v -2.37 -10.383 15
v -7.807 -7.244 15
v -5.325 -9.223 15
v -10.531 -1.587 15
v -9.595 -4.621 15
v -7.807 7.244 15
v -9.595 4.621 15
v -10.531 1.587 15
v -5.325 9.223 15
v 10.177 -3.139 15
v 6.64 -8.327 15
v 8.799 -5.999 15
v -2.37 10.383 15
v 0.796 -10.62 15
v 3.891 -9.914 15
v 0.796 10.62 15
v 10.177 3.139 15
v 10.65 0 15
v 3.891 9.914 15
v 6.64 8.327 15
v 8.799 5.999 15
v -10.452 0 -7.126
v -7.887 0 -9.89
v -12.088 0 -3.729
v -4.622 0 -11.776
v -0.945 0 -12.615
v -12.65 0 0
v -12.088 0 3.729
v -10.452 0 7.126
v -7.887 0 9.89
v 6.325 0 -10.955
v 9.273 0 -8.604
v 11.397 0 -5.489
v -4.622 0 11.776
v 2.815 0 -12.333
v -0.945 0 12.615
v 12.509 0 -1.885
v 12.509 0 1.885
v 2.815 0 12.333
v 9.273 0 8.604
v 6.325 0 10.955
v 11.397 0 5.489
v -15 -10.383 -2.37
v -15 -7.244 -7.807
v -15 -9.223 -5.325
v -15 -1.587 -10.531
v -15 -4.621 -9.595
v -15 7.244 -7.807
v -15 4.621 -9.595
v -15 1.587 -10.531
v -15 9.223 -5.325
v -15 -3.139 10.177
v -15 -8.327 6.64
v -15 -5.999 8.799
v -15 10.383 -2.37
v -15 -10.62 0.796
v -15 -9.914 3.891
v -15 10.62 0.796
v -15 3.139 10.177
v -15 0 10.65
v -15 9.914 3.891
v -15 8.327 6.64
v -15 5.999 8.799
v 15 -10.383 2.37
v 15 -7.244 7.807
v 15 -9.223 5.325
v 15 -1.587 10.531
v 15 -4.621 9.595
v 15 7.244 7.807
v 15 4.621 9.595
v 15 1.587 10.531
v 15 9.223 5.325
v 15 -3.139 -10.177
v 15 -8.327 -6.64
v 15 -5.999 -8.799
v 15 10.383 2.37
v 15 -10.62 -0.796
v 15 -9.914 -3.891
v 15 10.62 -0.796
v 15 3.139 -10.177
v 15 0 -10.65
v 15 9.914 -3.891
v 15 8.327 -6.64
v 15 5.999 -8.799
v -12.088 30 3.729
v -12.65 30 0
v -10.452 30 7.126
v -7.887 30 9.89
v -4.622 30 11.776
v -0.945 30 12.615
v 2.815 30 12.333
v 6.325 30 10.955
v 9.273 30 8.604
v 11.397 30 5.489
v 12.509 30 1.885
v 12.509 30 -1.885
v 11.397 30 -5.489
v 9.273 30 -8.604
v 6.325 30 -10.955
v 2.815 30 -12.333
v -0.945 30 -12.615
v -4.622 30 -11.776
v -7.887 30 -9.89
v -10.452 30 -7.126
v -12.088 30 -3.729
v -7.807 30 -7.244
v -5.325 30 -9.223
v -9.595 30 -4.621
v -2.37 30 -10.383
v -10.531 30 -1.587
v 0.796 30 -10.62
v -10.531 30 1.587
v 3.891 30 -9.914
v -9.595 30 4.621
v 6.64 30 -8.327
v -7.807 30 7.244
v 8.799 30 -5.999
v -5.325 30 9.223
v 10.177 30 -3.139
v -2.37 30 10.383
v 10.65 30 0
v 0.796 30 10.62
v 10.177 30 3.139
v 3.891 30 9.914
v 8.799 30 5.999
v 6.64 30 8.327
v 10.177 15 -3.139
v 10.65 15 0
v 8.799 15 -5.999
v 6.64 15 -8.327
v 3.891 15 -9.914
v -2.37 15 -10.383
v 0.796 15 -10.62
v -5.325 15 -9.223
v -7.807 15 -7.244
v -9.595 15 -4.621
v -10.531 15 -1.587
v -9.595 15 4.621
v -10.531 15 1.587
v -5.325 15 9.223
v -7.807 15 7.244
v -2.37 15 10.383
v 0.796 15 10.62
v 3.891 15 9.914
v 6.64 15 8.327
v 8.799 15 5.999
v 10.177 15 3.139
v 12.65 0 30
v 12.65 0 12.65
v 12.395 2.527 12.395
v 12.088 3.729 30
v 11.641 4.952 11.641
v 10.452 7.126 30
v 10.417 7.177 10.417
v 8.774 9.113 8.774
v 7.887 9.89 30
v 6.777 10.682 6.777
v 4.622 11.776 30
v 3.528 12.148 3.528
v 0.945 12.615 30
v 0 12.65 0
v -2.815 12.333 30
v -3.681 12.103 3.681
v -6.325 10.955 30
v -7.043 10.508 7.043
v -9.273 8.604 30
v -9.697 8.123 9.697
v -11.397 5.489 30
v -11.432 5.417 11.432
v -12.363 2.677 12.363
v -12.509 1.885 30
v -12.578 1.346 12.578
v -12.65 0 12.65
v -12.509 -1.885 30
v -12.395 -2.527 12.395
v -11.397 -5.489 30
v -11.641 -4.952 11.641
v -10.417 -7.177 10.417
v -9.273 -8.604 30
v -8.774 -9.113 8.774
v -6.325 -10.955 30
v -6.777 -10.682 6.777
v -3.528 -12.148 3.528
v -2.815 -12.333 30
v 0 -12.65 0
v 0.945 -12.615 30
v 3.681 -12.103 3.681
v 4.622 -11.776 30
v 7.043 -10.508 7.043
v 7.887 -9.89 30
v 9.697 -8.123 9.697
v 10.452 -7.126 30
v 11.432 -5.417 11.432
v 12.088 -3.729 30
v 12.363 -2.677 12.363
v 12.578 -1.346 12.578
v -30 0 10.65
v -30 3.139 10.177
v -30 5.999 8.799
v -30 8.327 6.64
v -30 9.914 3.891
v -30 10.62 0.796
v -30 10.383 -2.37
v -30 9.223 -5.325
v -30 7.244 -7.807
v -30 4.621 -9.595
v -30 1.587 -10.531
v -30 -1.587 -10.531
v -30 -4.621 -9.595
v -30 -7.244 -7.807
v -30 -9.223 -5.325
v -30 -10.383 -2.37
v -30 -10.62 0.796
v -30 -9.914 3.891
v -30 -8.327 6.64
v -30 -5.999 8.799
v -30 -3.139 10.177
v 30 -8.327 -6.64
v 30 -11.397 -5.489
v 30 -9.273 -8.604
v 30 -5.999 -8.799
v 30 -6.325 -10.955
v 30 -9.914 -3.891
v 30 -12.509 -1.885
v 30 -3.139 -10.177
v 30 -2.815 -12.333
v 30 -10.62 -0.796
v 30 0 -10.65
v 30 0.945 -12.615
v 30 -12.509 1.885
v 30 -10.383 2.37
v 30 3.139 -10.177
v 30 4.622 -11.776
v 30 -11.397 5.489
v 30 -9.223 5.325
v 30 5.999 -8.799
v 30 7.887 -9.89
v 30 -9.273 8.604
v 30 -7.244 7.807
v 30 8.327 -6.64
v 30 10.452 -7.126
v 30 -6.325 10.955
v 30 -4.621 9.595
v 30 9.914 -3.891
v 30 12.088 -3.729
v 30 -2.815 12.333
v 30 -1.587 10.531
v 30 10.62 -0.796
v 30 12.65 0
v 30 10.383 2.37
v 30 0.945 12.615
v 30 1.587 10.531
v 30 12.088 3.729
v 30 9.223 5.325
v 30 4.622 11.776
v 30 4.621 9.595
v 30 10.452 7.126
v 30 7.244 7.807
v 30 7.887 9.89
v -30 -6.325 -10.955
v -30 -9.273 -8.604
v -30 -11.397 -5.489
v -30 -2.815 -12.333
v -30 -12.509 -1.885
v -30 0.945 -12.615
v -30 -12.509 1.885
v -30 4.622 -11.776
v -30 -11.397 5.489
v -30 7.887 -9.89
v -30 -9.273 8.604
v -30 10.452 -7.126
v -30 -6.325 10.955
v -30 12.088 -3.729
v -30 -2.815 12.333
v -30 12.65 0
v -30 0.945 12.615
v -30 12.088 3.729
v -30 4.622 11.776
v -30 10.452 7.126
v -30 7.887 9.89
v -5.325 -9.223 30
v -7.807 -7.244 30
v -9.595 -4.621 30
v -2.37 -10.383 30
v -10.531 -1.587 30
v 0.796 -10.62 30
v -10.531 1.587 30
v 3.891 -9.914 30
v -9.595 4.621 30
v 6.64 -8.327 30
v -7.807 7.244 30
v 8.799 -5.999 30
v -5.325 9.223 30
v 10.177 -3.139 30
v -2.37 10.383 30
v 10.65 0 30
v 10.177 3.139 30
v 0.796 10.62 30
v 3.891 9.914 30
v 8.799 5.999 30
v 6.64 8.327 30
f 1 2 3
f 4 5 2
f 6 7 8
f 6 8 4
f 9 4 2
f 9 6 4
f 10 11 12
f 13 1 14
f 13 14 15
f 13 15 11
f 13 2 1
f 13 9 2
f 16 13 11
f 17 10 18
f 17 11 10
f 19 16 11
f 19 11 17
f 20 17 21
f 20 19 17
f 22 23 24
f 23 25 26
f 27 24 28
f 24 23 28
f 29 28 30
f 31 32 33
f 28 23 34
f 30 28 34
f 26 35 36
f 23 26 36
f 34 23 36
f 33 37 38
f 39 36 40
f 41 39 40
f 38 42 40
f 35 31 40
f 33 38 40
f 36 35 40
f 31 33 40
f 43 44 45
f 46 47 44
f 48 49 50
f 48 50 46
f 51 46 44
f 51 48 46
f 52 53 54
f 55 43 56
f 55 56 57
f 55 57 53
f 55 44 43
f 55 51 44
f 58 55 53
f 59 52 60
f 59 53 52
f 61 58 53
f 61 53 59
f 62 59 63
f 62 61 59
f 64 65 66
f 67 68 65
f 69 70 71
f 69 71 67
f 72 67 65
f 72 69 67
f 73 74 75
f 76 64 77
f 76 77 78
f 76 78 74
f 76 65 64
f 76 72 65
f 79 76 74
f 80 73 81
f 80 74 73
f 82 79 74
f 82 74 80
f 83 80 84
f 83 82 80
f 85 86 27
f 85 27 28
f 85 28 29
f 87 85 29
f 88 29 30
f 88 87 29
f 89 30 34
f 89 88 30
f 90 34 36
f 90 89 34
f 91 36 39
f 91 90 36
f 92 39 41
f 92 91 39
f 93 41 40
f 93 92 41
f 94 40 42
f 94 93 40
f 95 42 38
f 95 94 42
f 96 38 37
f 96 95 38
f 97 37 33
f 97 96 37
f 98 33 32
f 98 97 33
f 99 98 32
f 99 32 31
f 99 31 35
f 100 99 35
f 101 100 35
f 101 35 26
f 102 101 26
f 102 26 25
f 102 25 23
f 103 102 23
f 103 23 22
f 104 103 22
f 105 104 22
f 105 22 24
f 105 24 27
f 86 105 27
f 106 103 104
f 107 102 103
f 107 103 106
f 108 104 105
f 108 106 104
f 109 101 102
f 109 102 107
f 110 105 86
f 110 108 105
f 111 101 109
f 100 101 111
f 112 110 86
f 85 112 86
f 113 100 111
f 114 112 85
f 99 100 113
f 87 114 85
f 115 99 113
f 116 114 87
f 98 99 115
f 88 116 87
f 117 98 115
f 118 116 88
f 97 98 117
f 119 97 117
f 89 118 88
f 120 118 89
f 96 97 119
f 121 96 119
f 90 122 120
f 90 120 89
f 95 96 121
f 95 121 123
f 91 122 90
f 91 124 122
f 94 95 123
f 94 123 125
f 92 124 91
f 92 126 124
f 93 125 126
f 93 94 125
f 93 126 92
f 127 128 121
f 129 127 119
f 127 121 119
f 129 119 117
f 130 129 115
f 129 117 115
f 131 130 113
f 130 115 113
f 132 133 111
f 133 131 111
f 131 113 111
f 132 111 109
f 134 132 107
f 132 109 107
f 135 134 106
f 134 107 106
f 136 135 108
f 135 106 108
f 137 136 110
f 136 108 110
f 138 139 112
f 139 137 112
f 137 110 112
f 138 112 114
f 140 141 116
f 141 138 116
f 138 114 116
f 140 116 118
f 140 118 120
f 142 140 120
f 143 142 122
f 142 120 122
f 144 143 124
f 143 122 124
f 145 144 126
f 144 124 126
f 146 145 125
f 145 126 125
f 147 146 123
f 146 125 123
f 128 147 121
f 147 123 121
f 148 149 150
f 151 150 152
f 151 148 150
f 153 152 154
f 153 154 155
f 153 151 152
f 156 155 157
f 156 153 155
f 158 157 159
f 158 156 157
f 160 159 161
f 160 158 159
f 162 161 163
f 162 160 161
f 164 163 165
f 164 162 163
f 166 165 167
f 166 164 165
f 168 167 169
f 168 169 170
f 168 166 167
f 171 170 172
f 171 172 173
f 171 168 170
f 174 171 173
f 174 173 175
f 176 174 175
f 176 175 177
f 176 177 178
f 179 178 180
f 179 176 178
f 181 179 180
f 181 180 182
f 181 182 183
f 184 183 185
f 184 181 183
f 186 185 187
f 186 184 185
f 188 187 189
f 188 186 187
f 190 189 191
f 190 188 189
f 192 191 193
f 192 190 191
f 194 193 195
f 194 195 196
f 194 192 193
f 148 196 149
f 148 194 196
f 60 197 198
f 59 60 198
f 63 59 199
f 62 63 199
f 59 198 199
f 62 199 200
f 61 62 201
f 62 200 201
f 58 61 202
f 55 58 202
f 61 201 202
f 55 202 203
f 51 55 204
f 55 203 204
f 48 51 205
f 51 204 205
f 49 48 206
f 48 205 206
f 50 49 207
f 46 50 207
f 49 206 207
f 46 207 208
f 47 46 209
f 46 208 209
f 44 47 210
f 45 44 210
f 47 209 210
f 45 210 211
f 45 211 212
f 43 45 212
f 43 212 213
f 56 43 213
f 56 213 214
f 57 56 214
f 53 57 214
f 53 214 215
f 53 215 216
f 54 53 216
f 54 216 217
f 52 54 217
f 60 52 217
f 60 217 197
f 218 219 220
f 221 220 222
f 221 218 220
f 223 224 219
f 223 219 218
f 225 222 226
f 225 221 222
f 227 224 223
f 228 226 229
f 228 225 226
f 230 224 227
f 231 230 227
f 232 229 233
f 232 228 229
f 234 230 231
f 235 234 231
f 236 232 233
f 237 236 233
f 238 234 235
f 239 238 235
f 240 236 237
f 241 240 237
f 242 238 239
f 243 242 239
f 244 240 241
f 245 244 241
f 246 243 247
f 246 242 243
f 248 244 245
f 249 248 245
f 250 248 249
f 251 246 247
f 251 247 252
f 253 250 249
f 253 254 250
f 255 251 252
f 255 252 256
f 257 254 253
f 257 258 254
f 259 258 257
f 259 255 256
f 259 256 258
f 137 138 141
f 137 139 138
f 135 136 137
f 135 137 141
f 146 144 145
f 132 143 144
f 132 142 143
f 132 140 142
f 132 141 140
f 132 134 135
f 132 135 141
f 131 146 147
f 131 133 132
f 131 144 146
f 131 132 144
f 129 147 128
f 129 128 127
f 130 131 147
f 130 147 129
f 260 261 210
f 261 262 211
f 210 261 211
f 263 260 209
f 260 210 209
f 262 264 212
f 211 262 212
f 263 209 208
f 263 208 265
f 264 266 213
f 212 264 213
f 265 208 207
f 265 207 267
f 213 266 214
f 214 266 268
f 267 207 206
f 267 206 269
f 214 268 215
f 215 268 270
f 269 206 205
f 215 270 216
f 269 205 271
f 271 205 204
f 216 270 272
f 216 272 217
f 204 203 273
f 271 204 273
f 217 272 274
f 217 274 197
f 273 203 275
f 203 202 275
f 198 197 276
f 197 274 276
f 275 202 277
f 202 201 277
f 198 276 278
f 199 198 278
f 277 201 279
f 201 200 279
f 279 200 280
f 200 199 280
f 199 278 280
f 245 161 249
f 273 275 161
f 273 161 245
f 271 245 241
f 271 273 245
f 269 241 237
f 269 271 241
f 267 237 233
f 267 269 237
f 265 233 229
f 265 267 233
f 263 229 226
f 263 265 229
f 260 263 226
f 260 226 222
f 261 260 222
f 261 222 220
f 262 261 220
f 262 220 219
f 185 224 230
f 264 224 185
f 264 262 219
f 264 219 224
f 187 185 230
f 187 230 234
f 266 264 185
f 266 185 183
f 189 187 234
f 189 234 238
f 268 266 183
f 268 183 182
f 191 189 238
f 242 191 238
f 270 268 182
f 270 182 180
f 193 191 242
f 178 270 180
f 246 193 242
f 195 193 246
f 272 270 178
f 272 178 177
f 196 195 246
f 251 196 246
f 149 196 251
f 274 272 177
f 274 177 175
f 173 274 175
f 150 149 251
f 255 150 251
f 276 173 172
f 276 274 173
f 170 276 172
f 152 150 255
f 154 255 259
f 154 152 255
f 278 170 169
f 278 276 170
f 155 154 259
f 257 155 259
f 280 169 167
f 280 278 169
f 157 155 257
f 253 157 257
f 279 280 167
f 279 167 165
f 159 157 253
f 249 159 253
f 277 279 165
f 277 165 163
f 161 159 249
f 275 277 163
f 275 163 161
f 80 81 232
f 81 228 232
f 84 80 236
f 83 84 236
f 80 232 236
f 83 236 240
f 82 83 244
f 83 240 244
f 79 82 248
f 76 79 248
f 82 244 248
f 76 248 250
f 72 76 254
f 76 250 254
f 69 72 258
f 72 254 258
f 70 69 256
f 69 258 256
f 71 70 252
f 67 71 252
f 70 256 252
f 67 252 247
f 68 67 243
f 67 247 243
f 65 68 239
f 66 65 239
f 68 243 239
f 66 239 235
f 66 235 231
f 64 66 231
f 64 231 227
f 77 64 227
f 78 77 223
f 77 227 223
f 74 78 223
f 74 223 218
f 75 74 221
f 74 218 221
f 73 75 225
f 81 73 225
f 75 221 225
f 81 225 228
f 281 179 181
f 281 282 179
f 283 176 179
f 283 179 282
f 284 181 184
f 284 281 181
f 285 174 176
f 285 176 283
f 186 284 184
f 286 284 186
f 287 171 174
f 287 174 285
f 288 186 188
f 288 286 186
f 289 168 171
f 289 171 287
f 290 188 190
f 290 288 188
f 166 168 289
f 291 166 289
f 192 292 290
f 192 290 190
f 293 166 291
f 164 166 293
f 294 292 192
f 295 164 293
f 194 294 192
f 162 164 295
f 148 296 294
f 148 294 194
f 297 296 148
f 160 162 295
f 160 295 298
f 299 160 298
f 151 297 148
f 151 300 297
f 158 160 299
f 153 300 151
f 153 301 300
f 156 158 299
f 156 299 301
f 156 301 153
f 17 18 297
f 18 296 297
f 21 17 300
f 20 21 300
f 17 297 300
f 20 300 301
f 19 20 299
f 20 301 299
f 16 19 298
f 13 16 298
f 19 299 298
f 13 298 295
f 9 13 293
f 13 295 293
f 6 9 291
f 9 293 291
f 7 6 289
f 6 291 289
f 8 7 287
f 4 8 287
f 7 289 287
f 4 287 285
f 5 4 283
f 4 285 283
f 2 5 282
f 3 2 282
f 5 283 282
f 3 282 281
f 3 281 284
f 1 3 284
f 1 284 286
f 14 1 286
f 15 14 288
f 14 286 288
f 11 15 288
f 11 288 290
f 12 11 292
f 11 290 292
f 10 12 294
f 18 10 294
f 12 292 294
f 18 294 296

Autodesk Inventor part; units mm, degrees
sketch "Sketch1" plane through (0, 0, 0) normal (0, 1, 0) x (-1, 0, 0)
  line L0 (0, 0) -> (0, 30)
  line L1 (0, 0) -> (-30, 0)
  dimension "d0" = 30
  dimension "d1" = 30
ref_plane "Work Plane1" through (0, 0, 30) normal (0, 0, 1) x (1, 0, 0)
sketch "Sketch2" plane through (0, 0, 30) normal (0, 0, 1) x (1, 0, 0)
  circle A0 centre (0, 0) radius 12.65
  dimension "d2" = 25.3
sketch "Sketch3" plane through (0, 0, 0) normal (0, 1, 0) x (-1, 0, 0)
  line L0 (0, 0) -> (0, 30) projected
sweep "Sweep1" add profiles "Sketch2" path "Sketch3"
sketch "Sketch4" plane through (0, 0, 0) normal (1, 0, 0) x (0, 1, 0)
  line L0 (0, 0) -> (30, 0)
  dimension "d5" = 30
ref_plane "Work Plane2" through (0, 30, 0) normal (0, 1, 0) x (-1, 0, 0)
sketch "Sketch5" plane through (0, 30, 0) normal (0, 1, 0) x (-1, 0, 0)
  circle A0 centre (0, 0) radius 12.65
  dimension "d6" = 25.3
sweep "Sweep2" add profiles "Sketch5" path "Sketch4" separate body
sketch "Sketch6" plane through (0, 0, 0) normal (0, 1, 0) x (-1, 0, 0)
  line L0 (0, 0) -> (-30, 0) projected
ref_plane "Work Plane3" through (30, 0, 0) normal (1, 0, 0) x (0, 1, 0)
sketch "Sketch12" plane through (0, 0, 0) normal (1, 0, 0) x (0, 1, 0)
  circle A0 centre (0, 0) radius 12.65
  dimension "d15" = 25.3
extrude "Extrusion1" add sketch "Sketch12" along normal mid plane 60 bodies 1
sketch "Sketch14" plane through (0, 30, 0) normal (0, 1, 0) x (1, 0, 0)
  line L0 (-12.65, -12.65) -> (0, 0) projected
  circle A0 centre (0, 0) radius 10.65
  dimension "d21" = 21.3
sketch "Sketch18" plane through (-30, 0, 0) normal (-1, 0, 0) x (0, 0, 1)
  circle A0 centre (0, 0) radius 10.65
  dimension "d30" = 21.3
extrude "Extrusion7" cut sketch "Sketch18" against normal blind 15 bodies 1
sketch "Sketch19" plane through (30, 0, 0) normal (1, 0, 0) x (0, 0, -1)
  circle A0 centre (0, 0) radius 10.65
  dimension "d33" = 21.3
extrude "Extrusion8" cut sketch "Sketch19" against normal blind 15 bodies 1
sketch "Sketch20" plane through (0, 0, 30) normal (0, 0, 1) x (1, 0, 0)
  circle A0 centre (0, 0) radius 10.65
  dimension "d36" = 21.3
extrude "Extrusion9" cut sketch "Sketch20" against normal blind 15 bodies 1
extrude "Extrusion10" cut sketch "Sketch14" against normal blind 15 bodies 2
equation "\"d1\" = d0"
properties part number "hoek vierweg" material "ABS Plastic"
